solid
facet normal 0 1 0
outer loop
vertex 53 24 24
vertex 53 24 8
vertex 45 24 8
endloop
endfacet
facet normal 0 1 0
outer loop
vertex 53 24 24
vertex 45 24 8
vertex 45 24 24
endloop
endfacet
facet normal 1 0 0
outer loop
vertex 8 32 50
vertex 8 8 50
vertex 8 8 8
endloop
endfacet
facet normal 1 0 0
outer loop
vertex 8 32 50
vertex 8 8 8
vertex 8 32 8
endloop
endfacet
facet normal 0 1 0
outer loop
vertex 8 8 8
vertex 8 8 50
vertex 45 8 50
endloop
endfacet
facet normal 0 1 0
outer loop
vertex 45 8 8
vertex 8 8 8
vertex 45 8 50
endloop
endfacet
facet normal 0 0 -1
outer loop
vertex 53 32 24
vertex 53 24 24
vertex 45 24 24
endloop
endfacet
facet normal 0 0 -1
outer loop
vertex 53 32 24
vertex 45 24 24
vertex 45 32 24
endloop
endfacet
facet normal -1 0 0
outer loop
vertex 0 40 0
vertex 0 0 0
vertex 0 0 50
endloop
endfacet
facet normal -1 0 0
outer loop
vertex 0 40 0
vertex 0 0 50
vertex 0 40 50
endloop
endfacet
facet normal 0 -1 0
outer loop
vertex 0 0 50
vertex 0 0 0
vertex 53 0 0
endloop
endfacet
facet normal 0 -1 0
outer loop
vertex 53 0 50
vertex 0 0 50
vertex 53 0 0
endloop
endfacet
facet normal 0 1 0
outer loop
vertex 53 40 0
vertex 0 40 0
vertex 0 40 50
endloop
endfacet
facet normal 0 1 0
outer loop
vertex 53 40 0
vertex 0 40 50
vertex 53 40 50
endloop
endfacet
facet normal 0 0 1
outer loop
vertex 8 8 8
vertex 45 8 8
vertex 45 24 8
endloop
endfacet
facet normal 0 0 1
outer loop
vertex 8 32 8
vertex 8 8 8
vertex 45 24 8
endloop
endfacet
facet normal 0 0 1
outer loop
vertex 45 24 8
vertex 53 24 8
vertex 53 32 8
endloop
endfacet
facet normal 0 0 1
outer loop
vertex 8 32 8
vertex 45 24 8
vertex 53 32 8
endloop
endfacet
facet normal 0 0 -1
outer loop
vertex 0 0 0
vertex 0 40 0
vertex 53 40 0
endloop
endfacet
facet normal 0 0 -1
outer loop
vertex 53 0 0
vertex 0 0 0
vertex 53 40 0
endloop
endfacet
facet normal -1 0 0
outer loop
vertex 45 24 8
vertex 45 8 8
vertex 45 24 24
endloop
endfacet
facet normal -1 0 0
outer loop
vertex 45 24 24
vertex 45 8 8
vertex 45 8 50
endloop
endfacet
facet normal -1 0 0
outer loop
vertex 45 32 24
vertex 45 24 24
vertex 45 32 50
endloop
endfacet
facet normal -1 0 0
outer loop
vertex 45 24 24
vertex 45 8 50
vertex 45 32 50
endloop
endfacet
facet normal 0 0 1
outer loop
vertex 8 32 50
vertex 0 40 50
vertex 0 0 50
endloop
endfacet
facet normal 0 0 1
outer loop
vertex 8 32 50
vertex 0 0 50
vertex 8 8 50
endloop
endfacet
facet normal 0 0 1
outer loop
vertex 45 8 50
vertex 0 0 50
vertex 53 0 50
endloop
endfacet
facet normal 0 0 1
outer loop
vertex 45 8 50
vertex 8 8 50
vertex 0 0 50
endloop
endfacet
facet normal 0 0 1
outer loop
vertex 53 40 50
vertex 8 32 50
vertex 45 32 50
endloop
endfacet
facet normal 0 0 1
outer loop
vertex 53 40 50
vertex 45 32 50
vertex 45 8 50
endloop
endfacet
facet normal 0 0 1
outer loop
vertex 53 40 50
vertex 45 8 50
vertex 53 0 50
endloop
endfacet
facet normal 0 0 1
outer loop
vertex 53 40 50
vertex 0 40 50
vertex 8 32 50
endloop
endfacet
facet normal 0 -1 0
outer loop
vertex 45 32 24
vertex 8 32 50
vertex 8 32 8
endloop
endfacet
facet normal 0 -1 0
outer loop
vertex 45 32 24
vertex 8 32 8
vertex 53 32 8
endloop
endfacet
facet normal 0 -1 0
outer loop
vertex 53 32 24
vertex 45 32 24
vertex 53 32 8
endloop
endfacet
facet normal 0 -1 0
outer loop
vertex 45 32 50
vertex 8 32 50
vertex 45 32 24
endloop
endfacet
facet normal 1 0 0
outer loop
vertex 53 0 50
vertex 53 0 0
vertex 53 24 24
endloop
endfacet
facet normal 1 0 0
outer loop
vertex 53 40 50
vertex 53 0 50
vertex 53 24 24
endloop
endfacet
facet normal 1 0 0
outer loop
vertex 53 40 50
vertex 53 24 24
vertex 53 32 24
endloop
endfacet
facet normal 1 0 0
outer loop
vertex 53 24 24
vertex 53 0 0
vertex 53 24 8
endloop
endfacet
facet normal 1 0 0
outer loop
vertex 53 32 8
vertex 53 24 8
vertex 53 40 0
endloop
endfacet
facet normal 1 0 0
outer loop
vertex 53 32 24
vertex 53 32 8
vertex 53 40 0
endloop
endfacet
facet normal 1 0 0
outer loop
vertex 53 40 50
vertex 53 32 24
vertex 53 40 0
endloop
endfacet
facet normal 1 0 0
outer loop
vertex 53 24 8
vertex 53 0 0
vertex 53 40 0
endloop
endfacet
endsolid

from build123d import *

# Parameters (mm, degrees)
F0_W     = 53
F0_H     = 40
F1_DEPTH = 50
F2_W     = 37
F2_H     = 24
F3_DEPTH = 42
F4_W     = 8
F4_H     = 16
F5_DEPTH = 8


with BuildPart() as f1:
    # F0 (on Top) → F1 (new body)
    with BuildSketch(Plane.XY):
        with Locations((26.5, 20)):
            Rectangle(F0_W, F0_H)
    extrude(amount=F1_DEPTH)

    # F2 (on face) → F3 (cut)
    with BuildSketch(Plane.XY.offset(50)):
        with Locations((26.5, 20)):
            Rectangle(F2_W, F2_H)
    extrude(amount=-F3_DEPTH, mode=Mode.SUBTRACT)

    # F4 (on face) → F5 (cut, through all)
    with BuildSketch(Plane.YZ.offset(53)):
        with Locations((28, 16)):
            Rectangle(F4_W, F4_H)
    extrude(amount=-F5_DEPTH, mode=Mode.SUBTRACT)


solid = f1.part
